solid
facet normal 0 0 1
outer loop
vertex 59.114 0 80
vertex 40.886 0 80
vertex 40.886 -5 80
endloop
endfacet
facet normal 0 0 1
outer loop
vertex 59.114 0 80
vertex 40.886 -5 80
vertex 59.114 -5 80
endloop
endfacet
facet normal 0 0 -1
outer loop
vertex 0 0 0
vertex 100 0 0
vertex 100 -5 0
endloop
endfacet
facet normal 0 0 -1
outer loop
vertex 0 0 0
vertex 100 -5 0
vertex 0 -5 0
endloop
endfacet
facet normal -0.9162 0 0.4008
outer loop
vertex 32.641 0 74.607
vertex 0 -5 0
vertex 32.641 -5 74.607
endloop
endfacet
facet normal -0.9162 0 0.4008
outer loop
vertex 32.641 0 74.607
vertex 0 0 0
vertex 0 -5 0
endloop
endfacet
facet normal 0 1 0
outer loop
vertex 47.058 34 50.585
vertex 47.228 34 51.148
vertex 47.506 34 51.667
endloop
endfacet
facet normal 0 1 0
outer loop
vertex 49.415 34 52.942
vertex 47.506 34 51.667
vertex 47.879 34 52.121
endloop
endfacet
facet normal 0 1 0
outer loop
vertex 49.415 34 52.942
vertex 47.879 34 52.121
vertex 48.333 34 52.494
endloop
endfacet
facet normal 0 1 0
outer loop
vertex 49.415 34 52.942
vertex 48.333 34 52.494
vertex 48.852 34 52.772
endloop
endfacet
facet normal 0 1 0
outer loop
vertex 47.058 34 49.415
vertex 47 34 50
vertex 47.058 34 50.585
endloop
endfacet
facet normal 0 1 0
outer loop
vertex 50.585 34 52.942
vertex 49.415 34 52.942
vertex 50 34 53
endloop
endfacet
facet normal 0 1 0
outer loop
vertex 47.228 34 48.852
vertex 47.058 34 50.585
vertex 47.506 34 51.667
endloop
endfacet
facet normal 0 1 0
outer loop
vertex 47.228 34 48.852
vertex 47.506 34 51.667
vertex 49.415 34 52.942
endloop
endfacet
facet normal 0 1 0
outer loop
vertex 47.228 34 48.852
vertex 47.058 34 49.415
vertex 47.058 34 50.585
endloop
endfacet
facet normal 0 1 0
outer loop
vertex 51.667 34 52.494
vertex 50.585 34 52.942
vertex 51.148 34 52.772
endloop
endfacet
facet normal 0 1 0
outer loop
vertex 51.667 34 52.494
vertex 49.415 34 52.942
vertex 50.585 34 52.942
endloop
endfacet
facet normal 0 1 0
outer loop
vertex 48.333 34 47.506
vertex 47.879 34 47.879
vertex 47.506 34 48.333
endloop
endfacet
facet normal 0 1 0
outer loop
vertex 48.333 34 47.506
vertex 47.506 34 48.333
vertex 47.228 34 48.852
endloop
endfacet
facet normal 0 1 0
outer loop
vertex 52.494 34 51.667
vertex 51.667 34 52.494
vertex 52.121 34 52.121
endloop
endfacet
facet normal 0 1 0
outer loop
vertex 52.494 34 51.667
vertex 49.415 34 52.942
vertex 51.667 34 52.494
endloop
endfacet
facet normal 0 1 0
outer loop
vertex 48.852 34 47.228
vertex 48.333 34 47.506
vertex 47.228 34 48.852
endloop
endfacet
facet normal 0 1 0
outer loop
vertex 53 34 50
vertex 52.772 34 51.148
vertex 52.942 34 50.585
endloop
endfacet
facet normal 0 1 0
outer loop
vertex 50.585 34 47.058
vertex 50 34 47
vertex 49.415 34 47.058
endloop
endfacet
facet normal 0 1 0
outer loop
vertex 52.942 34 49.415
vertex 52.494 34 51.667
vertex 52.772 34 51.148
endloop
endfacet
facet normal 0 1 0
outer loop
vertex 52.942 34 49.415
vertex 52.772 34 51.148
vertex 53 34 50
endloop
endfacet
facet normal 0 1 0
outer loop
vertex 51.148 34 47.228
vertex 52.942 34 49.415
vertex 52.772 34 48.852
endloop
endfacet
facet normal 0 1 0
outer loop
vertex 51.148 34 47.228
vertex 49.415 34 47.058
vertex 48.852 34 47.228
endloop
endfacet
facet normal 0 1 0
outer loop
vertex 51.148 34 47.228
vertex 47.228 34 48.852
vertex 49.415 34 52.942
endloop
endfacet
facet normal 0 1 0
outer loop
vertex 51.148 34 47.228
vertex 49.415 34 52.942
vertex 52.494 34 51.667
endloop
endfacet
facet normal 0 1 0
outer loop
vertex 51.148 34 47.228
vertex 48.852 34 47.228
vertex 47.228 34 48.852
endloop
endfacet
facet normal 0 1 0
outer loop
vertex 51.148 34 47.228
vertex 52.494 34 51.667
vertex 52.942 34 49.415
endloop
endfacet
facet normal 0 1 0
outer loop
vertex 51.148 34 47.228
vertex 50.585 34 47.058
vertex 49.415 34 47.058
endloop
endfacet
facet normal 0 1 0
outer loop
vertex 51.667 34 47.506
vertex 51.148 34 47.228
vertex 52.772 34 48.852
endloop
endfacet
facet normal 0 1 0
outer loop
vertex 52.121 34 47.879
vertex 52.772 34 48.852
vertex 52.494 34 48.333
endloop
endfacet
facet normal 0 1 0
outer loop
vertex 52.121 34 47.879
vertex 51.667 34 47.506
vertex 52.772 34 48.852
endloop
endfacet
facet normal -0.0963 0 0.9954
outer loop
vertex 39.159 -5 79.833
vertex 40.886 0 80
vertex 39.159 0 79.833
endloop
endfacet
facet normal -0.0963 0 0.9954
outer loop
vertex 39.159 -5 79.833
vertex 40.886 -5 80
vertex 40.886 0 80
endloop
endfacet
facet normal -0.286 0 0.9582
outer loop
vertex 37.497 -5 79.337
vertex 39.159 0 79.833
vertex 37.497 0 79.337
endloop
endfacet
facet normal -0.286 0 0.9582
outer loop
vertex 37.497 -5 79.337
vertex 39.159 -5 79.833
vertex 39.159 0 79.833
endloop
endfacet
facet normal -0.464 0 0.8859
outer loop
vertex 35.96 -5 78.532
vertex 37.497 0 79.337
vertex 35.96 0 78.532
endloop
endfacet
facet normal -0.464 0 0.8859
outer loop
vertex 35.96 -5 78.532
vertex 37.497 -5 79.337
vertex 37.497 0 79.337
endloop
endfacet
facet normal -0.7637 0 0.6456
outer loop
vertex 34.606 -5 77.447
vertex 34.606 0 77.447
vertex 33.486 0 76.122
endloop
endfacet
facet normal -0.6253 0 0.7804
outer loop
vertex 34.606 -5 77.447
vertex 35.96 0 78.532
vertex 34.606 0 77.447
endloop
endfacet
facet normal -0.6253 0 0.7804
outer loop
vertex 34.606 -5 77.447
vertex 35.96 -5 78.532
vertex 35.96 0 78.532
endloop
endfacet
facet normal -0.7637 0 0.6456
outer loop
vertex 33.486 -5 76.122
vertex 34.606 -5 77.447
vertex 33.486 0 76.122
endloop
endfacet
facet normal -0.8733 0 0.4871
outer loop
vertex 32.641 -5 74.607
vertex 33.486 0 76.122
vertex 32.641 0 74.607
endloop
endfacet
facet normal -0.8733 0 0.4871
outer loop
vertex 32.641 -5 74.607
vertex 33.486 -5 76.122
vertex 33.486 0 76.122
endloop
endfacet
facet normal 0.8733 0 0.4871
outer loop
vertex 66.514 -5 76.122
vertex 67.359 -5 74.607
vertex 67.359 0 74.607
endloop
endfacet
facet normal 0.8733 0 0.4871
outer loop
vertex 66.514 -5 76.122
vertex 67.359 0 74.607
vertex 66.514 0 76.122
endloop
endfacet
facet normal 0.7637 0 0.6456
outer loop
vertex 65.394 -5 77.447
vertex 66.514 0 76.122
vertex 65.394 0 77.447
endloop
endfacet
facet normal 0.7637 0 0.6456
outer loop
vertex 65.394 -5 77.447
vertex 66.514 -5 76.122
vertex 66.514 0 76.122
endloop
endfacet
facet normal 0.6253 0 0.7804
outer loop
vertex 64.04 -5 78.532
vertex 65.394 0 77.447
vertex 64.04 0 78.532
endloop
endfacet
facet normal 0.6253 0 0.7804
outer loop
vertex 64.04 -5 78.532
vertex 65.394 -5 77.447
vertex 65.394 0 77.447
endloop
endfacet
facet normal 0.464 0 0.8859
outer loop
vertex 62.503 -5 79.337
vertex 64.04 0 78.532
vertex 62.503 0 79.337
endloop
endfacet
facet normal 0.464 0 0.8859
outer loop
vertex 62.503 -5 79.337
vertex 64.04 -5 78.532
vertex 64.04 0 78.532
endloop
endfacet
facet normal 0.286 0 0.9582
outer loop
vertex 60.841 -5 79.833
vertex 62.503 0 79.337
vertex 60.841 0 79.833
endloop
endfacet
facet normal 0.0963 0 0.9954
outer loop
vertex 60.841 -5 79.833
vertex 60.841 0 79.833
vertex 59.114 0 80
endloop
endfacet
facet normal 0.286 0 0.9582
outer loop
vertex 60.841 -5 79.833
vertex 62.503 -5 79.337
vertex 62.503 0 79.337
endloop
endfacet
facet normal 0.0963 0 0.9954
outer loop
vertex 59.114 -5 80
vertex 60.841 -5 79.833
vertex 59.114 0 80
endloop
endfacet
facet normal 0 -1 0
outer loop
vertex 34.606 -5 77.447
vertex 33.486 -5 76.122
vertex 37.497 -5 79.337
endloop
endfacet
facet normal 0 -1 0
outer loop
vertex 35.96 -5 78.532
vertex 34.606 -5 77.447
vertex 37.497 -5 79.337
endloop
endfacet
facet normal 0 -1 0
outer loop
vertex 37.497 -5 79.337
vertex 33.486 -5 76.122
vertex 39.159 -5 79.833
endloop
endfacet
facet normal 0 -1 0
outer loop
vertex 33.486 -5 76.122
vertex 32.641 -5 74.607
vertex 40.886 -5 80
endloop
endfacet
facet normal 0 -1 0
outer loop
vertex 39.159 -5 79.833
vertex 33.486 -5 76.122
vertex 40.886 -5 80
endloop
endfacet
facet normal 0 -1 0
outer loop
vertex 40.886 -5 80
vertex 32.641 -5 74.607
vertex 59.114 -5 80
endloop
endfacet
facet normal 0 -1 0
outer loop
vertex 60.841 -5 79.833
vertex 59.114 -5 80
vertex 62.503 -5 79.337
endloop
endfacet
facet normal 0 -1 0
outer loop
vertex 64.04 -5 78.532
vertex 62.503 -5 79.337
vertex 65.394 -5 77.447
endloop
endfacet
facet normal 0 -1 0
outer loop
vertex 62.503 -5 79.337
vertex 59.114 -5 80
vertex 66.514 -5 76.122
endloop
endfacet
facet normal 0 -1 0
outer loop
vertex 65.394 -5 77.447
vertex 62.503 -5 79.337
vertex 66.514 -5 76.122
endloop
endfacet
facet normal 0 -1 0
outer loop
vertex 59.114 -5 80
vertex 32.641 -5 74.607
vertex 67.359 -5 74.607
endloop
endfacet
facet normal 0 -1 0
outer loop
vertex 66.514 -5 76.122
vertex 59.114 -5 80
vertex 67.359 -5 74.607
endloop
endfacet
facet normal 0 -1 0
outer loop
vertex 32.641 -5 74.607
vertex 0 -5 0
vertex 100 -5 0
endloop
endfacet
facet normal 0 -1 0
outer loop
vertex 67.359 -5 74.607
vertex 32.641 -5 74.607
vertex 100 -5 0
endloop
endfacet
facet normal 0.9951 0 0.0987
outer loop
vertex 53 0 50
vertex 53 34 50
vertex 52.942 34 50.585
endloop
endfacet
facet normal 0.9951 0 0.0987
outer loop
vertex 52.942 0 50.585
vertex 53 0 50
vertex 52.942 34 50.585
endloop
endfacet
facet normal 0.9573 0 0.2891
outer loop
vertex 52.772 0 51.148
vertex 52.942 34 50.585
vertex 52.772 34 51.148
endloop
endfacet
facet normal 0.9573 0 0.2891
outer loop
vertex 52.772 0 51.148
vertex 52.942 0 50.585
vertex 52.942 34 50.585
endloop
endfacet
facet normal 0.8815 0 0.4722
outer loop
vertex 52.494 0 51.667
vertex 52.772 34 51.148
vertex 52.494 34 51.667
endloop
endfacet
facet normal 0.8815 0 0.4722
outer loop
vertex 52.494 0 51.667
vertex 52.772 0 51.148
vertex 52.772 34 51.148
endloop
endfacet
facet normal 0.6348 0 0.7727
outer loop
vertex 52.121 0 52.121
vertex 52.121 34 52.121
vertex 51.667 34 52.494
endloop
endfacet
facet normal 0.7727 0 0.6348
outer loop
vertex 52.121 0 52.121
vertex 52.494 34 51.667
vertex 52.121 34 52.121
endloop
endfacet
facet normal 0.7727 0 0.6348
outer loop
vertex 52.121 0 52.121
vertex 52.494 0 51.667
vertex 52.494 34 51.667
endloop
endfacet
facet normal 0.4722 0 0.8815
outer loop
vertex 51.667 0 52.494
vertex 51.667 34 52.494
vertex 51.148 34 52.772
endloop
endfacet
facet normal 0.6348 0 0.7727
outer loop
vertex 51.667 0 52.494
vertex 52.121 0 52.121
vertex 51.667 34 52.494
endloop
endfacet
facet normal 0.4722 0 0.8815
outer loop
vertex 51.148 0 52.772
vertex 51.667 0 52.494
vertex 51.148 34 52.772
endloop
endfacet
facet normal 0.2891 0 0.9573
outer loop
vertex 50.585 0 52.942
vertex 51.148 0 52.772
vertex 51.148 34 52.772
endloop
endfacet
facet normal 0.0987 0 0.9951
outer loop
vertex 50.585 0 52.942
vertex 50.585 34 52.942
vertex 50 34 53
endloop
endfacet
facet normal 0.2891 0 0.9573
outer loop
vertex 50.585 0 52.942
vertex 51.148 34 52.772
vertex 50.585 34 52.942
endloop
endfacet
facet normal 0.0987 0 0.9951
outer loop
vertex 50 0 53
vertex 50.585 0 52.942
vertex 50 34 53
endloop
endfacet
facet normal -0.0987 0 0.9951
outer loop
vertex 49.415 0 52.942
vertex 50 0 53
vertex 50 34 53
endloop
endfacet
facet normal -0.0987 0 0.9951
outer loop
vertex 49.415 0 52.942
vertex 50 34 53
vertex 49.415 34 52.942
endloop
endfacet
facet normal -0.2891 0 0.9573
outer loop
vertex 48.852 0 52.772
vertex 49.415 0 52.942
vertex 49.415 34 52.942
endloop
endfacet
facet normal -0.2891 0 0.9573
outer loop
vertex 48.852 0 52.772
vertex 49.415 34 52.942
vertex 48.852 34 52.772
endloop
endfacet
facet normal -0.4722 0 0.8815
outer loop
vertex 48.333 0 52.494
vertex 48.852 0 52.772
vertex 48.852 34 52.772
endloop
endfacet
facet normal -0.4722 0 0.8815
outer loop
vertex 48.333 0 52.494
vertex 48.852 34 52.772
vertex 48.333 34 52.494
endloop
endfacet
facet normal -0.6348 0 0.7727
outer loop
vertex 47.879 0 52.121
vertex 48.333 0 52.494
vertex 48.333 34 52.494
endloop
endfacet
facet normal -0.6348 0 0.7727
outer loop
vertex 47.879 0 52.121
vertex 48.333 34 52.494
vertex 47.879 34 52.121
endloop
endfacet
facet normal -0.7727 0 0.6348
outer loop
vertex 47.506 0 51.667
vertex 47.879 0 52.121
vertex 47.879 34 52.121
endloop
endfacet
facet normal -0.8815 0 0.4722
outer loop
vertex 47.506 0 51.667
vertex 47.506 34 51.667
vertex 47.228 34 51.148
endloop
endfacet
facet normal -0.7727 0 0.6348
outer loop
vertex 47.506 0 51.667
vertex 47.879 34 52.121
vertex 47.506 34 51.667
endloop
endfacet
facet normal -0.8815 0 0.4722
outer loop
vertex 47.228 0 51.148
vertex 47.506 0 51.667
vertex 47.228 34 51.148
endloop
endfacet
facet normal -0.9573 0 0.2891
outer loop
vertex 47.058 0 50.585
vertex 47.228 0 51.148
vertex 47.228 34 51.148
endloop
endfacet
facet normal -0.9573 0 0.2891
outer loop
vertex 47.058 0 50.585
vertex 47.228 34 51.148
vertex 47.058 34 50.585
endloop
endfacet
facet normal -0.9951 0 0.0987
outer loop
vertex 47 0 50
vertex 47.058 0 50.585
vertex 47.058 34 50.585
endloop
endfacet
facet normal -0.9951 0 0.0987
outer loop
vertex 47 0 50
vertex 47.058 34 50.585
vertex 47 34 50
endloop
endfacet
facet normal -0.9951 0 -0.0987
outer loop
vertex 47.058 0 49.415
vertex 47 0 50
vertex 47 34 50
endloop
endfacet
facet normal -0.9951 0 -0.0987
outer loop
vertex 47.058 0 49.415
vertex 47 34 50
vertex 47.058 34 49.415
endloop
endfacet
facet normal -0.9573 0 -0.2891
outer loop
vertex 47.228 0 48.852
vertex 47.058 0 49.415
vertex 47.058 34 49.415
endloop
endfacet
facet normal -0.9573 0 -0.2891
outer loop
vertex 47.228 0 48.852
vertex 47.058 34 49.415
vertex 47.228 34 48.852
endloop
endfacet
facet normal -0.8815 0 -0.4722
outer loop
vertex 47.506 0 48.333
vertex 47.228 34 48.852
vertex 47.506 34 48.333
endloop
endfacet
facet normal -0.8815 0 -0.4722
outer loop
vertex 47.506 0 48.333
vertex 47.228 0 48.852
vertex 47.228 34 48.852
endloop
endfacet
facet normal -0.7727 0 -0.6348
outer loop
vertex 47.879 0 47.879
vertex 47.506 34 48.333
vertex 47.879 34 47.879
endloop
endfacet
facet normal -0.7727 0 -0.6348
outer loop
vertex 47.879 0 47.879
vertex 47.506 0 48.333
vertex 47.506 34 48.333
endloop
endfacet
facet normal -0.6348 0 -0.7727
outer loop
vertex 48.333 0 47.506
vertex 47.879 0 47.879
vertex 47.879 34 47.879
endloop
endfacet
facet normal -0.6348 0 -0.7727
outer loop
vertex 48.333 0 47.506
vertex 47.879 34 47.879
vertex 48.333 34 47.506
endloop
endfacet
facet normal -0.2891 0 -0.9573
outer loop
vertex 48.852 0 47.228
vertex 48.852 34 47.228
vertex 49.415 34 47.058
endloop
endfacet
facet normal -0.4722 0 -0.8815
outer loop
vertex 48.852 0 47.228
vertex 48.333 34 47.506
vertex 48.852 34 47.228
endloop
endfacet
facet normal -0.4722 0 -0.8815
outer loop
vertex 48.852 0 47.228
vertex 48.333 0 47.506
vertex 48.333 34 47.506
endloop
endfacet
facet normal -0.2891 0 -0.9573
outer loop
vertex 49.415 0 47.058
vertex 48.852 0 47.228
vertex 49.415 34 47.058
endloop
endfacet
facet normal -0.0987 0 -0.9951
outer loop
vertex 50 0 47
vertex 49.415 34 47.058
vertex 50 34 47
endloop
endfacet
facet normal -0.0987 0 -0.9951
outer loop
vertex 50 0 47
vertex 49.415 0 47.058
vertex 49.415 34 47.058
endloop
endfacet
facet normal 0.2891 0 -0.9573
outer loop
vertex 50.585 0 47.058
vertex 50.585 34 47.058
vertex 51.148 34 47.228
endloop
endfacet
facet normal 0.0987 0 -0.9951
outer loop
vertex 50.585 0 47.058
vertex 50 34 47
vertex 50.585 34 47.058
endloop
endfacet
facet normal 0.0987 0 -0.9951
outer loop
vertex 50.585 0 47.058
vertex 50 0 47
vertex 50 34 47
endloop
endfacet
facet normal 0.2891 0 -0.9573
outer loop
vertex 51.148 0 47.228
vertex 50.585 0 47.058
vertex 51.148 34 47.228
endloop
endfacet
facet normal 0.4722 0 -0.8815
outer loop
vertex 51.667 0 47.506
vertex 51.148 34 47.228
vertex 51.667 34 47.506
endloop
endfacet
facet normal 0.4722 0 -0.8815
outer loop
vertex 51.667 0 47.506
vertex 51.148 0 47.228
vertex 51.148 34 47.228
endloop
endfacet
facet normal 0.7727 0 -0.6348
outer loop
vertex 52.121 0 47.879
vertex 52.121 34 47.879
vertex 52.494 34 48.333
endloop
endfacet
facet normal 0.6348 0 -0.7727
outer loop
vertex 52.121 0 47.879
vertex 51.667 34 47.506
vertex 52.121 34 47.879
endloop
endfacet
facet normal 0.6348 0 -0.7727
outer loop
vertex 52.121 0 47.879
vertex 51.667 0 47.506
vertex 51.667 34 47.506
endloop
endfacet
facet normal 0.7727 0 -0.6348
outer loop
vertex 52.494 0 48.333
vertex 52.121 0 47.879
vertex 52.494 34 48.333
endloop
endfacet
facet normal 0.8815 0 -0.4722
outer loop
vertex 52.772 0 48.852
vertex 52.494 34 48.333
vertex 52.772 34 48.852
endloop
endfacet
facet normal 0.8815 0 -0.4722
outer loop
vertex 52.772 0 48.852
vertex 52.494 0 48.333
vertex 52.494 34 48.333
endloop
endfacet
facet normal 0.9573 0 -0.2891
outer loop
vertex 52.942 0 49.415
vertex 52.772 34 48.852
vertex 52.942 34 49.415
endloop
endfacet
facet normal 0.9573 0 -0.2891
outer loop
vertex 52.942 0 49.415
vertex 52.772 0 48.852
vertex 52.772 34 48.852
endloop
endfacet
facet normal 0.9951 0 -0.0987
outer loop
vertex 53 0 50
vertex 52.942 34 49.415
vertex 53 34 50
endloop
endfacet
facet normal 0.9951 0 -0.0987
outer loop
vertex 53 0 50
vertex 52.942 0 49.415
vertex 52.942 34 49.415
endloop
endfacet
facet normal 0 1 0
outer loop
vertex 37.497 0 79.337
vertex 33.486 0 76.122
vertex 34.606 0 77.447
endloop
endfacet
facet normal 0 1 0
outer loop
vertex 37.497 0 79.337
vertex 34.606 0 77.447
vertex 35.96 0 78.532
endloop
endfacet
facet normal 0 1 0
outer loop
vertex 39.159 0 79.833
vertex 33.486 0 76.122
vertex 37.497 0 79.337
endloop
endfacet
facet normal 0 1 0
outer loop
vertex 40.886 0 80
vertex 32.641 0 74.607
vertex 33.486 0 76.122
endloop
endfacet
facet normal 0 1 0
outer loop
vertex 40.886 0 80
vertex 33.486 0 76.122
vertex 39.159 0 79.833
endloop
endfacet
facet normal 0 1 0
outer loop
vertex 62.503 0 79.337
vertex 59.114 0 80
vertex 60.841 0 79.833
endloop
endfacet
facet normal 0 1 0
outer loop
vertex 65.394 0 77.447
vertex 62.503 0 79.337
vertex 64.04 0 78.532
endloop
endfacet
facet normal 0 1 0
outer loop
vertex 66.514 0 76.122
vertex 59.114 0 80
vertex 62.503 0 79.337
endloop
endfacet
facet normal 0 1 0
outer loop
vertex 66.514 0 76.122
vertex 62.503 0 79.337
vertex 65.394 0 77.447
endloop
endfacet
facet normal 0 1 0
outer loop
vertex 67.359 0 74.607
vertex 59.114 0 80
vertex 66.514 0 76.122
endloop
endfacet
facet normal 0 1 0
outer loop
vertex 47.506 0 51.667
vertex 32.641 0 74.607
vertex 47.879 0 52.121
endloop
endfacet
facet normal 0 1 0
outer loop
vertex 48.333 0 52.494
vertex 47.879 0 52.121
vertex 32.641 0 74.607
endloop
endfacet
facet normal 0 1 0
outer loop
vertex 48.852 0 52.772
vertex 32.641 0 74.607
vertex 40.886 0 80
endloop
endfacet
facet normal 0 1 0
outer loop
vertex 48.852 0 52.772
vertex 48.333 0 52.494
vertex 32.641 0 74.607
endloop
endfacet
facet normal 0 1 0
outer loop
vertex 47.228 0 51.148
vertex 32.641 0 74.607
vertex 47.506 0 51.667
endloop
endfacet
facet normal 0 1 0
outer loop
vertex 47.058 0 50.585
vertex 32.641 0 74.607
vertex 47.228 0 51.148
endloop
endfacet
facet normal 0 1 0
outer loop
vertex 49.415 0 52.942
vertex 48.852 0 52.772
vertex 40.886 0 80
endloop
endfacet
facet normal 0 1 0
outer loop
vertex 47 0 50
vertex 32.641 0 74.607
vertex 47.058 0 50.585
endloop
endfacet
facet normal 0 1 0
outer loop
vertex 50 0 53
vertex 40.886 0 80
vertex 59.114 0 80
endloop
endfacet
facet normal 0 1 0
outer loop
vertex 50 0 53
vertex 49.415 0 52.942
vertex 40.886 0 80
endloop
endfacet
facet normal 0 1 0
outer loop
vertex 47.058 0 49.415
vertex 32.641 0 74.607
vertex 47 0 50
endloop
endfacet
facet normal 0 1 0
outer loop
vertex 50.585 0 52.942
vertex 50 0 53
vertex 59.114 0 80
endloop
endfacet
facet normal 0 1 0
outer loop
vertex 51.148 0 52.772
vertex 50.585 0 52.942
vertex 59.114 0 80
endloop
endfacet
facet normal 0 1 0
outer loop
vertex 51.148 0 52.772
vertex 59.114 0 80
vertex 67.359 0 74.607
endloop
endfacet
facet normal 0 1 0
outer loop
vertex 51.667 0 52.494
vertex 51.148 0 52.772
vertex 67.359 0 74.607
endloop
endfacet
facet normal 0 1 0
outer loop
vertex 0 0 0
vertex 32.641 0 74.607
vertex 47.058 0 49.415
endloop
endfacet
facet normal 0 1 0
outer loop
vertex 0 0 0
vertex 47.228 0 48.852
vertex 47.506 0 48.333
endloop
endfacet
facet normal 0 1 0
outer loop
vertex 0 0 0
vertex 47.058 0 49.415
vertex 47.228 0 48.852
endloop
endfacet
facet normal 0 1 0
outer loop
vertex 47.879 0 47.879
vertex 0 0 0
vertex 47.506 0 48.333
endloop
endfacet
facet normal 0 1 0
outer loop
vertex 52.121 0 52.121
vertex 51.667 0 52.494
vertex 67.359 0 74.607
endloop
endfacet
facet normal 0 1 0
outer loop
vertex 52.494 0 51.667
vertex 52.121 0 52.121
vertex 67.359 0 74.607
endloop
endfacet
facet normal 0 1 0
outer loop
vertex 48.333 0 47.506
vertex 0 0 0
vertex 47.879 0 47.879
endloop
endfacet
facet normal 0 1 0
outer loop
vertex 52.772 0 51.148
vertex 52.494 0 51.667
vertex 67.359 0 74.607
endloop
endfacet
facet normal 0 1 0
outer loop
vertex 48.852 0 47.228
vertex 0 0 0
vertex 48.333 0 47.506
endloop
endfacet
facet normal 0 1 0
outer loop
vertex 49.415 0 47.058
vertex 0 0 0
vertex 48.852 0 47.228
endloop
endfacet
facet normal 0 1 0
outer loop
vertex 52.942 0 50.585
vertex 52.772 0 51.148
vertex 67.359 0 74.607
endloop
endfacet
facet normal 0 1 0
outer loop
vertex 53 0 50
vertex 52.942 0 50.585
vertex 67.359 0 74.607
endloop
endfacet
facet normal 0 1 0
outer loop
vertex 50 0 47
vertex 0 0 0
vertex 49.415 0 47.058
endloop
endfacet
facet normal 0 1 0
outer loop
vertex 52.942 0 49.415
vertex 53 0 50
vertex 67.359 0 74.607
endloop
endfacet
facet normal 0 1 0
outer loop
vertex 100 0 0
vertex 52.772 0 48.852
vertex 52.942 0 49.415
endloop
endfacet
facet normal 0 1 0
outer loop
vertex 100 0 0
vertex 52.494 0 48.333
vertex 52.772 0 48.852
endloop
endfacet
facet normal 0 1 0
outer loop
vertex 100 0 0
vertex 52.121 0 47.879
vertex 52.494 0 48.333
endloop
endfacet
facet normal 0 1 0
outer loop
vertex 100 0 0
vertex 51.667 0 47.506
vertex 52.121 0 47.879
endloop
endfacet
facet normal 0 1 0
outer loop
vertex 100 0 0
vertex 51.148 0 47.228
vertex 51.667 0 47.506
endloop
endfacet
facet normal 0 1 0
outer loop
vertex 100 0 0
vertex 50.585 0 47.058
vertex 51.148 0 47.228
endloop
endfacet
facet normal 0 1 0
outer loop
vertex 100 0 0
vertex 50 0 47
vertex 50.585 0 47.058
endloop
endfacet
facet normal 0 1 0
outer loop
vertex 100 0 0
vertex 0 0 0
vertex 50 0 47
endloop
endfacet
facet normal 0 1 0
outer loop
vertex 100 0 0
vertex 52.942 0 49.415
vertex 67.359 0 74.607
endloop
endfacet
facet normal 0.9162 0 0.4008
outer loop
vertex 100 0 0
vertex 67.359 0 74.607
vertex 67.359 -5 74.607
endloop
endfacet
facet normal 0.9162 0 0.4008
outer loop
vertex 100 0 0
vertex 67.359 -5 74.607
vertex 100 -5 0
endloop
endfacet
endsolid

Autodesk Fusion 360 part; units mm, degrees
sketch "Sketch1" plane through (0, 0, 0) normal (0, 1, 0) x (1, 0, 0)
  line L0 (0, 0) -> (35, -80)
  line L1 (35, -80) -> (65, -80)
  line L2 (65, -80) -> (100, 0)
  line L3 (100, 0) -> (0, 0)
  circle A0 centre (50, -50) radius 7.5
  circle A1 centre (50, -50) radius 3
  dimension "d1" = 100
  dimension "d2" = 30
  dimension "d4" = 80
  dimension "d5" = 35
  dimension "d6" = 50
  dimension "d7" = 15
  dimension "d8" = 15
  dimension "d13" = 6
extrude "Extrude1" add sketch "Sketch1" against normal blind 5 contours L0 L1 L2 L3 | A0 | A1
extrude "Extrude2" add sketch "Sketch1" along normal blind 34 contours A1
fillet "Fillet1" radius 9 2 edges at (65, -2.5, 80) (35, -2.5, 80)
